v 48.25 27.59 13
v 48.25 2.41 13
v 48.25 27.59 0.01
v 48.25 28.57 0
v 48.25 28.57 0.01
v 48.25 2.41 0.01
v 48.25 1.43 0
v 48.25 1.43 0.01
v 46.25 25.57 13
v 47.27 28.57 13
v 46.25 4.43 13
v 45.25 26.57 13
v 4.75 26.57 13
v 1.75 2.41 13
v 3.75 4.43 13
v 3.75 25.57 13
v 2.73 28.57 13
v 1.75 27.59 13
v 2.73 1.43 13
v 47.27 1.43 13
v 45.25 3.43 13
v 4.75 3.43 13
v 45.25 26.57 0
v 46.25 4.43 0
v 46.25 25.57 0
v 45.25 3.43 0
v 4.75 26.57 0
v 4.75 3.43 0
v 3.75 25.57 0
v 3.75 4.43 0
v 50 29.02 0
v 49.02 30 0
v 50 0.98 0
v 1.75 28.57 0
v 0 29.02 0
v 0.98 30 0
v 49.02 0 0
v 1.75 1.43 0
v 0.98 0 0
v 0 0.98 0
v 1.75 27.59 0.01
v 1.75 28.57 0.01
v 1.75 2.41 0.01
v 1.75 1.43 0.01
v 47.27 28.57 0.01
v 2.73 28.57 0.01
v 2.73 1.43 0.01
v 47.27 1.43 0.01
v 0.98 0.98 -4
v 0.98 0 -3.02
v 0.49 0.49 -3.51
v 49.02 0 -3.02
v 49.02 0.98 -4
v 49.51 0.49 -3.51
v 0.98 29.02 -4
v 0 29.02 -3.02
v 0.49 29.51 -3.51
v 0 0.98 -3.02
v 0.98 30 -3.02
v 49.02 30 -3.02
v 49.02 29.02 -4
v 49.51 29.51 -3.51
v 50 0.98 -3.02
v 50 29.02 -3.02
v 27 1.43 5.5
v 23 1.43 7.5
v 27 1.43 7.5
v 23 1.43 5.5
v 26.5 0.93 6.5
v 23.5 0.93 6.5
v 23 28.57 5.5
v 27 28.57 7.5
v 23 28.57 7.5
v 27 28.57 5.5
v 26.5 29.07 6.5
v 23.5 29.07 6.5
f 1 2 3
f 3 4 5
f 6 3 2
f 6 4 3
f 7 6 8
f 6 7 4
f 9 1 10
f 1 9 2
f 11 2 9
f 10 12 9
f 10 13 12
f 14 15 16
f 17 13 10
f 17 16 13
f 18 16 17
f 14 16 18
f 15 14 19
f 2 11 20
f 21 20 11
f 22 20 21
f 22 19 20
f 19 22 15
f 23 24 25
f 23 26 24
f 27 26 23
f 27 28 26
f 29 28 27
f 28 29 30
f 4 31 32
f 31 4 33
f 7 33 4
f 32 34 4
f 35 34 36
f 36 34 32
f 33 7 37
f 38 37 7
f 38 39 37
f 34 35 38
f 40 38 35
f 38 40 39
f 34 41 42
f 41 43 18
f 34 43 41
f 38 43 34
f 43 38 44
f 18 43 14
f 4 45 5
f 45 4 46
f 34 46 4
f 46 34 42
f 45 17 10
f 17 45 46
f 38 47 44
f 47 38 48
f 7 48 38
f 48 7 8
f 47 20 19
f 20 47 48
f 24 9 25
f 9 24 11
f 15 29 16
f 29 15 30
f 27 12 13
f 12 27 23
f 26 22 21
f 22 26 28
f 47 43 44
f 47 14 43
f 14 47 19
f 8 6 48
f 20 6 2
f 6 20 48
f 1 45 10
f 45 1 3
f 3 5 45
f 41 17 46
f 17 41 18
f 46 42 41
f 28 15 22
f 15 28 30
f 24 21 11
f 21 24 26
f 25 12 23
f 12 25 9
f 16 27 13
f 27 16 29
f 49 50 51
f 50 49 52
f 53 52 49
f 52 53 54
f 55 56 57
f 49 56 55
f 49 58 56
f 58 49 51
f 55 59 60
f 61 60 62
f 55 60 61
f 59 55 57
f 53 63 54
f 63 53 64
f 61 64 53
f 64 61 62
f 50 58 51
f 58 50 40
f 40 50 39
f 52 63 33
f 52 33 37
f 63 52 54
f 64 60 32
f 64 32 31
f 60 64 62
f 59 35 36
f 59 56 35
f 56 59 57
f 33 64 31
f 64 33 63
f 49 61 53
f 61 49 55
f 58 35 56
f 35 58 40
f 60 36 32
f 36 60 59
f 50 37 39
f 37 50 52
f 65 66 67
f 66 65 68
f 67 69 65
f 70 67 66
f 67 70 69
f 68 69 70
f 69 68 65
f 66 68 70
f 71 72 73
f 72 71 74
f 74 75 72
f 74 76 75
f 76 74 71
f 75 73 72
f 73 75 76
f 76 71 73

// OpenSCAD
// When a small distance is needed to overlap shapes for boolean cutting, etc.
epsilon = 0.01;

module bevel(l, w, h){
   polyhedron(
           points=[[0,0,0], [l,0,0], [l,w,0], [0,w,0], [0,0,h], [l,0,h]],
           faces=[[0,1,2,3],[5,4,3,2],[0,4,5,1],[0,3,4],[5,2,1]]
           );
}

module shim(l, w, h){
   polyhedron(
           points=[[-l/2,-w/2,0], [l/2,-w/2,0], [l/2,w/2,0], [-l/2,w/2,0], [-l/2+w/4,0,h], [l/2-w/4,0,h]],
           faces=[[0,1,2,3],[5,4,3,2],[0,4,5,1],[0,3,4],[5,2,1]]
           );
}

module halfBevel(l, w, h) {
    bevel(l,h,h);
    translate([0,w,0])
        rotate(a = 270)
            bevel(w,h,h);
}

module fullBevel(l, w, h, b) {
    halfBevel(l, w, b);
    translate([l,w,0])
    rotate(a = 180)
        halfBevel(l, w, 1);
    
    translate([0,0,h])
        rotate(a = 90, v = [0, 1, 0])
            bevel(h,b,b);
    translate([l,0,h])
        rotate(a = 90)
            rotate(a = 90, v = [0, 1, 0])
                bevel(h,b,b);
    translate([l,w,h])
        rotate(a = 180)
            rotate(a = 90, v = [0, 1, 0])
                bevel(h,b,b);
    translate([0,w,h])
        rotate(a = 270)
            rotate(a = 90, v = [0, 1, 0])
                bevel(h,b,b);

}

module tubeBevel(l, w, h, b) {
    translate([0,0,h])
        rotate(a = 90, v = [0, 1, 0])
            bevel(h,b,b);
    translate([l,0,h])
        rotate(a = 90)
            rotate(a = 90, v = [0, 1, 0])
                bevel(h,b,b);
    translate([l,w,h])
        rotate(a = 180)
            rotate(a = 90, v = [0, 1, 0])
                bevel(h,b,b);
    translate([0,w,h])
        rotate(a = 270)
            rotate(a = 90, v = [0, 1, 0])
                bevel(h,b,b);
}

module beveledCube(l, w, h, b) {
  difference() {
      cube([l,w,h]);
      translate([-epsilon, -epsilon, -epsilon])
        fullBevel(l + 2 * epsilon, w + 2 * epsilon, h + 2 * epsilon, 1);
  }
}

module squareTube(l, w, h, t) {
   difference() {
      cube([l,w,h]);
      translate([t,t,-epsilon])
         cube([l - 2 * t, w - 2 * t, h + 2 * epsilon]);
   }
}

module beveledTube(l, w, h, t, b) {
    difference() {
        squareTube(l, w, h, 2);
        translate([-epsilon,-epsilon,epsilon])
            tubeBevel(l + 2 * epsilon, w + 2 * epsilon, h + epsilon, b);
    }
    translate([t,t,0])
        tubeBevel(l - 2 * t, w - 2 * t, h, b);
}

module endCap(cl, cw, ch, tl, tw, th, sl, sw, sh, t, b) {
    translate([ (cl - tl) / 2, (cw - tw) / 2, 0])
        beveledTube(tl, tw, th, t, b);

    translate([ 0, 0, -ch ])
        beveledCube(cl, cw, ch, b);
    
    
    translate([ cl / 2, (cw - tw) / 2, th / 2 ])
    rotate(a = 90, v = [1, 0, 0])
        shim(sl, sw, sh);
    
    translate([ cl / 2, cw / 2 + tw / 2, th / 2 ])
        rotate(a = 270, v = [1, 0, 0])
            shim(sl, sw, sh);

}

endCap(50, 30, 4, 46.5, 27.14, 13, 4, 2, 0.5, 2, 1);
